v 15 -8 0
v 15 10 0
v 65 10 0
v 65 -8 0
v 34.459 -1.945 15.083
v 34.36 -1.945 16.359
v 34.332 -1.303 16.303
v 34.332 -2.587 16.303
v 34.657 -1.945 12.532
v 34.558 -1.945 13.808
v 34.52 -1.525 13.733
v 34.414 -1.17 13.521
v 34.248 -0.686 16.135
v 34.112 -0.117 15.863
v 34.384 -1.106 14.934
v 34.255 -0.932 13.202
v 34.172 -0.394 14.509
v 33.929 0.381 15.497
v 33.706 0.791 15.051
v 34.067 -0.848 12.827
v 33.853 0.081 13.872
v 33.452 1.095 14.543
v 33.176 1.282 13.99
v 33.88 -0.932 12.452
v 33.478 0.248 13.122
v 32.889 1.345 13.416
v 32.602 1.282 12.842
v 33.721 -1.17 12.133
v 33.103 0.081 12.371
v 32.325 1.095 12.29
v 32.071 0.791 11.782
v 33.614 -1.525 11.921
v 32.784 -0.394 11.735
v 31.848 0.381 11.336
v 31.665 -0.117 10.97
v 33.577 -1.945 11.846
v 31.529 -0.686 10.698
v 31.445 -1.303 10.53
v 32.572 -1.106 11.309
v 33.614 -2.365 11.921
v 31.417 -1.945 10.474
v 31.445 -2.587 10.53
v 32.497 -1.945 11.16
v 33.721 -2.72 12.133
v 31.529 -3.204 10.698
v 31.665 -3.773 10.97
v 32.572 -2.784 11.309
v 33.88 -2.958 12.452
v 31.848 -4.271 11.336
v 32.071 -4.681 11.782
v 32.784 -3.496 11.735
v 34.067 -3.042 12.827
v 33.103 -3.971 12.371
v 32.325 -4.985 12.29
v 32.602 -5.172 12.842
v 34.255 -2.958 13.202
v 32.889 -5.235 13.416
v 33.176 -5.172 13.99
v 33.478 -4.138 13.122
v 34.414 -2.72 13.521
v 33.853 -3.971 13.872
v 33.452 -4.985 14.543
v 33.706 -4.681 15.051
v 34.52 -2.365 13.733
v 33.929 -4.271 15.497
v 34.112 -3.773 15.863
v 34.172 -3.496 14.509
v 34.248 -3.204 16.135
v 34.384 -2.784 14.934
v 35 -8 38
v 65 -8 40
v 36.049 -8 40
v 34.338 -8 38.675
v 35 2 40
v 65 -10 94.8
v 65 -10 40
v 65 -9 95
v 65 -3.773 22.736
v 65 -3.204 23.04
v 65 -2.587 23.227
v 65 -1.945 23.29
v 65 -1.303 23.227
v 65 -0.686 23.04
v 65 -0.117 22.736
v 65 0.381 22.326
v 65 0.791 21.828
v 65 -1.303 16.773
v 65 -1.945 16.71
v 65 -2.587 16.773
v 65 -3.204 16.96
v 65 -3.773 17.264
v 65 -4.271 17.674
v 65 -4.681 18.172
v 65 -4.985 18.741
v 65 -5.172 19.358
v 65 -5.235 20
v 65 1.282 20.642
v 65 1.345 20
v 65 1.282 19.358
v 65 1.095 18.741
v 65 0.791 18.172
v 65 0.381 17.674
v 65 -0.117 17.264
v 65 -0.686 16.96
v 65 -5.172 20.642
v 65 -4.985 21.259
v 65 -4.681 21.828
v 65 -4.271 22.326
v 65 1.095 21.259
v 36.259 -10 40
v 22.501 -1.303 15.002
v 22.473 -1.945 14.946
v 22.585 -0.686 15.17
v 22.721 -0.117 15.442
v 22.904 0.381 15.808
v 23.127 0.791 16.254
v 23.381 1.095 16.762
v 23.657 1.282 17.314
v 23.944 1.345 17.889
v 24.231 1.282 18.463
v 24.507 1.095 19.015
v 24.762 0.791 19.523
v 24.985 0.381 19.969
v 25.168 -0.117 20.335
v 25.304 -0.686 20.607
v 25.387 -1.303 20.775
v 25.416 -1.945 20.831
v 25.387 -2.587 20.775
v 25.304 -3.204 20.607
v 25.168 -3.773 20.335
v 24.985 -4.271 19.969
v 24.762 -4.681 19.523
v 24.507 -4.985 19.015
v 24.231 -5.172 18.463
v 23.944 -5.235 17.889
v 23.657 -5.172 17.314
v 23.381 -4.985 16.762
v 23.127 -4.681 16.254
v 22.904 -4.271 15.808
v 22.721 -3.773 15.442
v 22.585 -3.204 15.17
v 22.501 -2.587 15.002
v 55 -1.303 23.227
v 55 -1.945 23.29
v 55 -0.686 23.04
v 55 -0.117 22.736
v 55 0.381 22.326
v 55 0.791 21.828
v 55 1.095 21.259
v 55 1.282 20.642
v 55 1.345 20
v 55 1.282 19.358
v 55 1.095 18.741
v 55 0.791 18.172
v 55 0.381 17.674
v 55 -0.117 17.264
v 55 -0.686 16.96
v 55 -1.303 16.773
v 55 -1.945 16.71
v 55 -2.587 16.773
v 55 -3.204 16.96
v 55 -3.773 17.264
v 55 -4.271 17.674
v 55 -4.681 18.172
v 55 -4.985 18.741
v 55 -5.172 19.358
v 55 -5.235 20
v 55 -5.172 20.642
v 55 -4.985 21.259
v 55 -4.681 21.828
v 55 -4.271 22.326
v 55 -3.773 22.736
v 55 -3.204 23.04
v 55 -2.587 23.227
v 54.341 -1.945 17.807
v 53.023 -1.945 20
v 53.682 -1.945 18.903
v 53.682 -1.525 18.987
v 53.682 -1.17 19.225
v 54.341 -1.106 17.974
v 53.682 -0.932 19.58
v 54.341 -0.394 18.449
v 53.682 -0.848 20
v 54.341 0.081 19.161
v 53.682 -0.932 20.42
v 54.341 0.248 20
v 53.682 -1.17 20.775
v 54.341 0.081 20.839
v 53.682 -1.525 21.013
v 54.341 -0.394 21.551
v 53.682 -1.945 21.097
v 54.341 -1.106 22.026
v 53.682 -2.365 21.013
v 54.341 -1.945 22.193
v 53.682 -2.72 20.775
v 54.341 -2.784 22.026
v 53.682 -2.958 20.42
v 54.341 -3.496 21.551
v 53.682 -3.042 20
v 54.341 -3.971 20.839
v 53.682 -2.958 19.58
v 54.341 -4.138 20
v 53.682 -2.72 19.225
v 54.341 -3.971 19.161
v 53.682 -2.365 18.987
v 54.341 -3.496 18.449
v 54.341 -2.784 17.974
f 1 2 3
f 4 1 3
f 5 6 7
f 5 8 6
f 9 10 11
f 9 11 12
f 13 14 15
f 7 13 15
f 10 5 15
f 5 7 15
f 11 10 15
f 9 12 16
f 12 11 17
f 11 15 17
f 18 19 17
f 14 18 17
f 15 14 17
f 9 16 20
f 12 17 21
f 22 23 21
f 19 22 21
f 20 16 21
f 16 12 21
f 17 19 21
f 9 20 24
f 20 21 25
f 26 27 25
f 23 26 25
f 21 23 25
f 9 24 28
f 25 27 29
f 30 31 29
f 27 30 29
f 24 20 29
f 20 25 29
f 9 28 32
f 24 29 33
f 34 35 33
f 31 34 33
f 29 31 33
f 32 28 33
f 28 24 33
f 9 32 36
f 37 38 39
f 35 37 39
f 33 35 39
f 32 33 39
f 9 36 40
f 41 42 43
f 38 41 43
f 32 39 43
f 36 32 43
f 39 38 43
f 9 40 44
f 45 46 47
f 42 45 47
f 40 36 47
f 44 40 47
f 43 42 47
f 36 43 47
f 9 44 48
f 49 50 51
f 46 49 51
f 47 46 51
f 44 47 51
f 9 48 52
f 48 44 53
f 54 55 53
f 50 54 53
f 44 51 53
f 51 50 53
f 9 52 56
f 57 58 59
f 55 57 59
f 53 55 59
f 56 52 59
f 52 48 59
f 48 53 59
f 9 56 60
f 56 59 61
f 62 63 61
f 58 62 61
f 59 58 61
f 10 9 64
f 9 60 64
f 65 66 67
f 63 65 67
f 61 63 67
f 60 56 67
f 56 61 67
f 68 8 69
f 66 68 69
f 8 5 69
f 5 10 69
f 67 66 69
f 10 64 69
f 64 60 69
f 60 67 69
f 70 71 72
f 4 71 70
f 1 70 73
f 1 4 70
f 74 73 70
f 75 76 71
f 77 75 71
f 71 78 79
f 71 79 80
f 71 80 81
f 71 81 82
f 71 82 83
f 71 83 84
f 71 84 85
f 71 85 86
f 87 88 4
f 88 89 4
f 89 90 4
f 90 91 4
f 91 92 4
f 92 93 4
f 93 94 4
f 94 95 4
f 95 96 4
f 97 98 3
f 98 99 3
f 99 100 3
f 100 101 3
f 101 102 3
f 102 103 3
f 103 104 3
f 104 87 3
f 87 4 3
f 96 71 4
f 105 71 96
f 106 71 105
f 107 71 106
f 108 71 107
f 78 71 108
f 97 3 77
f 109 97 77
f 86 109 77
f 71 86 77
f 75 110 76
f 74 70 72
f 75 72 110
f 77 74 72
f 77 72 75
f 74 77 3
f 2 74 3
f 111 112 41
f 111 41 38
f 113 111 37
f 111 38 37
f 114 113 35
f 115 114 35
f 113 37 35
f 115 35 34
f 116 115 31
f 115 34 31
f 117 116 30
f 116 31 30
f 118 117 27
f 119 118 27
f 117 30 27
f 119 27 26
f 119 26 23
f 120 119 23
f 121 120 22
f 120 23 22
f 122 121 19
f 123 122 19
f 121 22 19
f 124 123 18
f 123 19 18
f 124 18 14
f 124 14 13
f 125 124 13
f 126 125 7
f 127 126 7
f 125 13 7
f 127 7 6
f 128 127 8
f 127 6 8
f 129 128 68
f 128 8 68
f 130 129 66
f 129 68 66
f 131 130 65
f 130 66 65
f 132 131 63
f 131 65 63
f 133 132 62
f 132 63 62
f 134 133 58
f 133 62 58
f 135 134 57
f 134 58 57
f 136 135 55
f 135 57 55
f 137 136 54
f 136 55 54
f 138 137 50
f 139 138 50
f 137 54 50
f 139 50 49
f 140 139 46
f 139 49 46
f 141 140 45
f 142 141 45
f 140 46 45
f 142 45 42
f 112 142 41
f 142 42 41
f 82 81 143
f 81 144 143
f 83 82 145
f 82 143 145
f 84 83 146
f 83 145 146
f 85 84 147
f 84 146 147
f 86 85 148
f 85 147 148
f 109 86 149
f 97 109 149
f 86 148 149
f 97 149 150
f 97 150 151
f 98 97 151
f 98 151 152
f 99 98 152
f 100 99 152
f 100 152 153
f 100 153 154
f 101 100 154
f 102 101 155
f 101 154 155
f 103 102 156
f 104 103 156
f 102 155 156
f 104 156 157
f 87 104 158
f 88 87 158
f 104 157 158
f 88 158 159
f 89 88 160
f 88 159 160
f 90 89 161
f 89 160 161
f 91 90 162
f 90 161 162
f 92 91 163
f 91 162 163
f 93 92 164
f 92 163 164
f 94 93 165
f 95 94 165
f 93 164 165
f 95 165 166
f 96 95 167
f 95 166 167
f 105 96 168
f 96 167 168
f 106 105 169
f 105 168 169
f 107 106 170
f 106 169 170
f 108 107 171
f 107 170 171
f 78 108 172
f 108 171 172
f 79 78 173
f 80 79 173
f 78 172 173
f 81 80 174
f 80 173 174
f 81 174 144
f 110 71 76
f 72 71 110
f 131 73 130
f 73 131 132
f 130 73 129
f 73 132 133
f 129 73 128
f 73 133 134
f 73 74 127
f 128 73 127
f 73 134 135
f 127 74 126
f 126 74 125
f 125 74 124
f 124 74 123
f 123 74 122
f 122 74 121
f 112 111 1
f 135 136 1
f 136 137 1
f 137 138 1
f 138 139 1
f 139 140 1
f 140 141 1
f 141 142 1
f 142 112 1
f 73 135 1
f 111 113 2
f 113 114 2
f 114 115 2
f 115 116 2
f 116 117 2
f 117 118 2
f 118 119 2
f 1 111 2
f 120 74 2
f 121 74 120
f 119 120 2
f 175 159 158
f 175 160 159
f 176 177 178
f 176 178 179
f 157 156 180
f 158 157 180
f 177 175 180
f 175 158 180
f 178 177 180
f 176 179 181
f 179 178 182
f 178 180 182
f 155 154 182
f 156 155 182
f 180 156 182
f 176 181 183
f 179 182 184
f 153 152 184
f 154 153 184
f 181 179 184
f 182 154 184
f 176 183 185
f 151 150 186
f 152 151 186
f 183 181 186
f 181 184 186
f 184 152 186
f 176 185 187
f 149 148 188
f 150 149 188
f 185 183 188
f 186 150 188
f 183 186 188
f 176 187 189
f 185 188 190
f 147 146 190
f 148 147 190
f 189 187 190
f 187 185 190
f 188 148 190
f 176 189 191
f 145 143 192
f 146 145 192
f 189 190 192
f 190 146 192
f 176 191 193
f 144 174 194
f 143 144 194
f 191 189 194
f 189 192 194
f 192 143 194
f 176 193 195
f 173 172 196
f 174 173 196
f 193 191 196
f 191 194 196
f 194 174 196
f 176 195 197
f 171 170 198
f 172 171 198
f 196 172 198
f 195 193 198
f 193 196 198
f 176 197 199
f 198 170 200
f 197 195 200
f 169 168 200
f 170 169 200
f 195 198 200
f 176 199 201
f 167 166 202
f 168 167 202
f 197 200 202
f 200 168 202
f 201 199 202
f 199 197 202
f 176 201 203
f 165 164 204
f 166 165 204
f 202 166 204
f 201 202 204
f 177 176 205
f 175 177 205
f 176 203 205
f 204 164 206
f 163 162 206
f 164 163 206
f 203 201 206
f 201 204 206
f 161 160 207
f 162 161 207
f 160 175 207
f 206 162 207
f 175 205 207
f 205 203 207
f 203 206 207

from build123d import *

# Parameters (mm, degrees)
ESBO_O1_W                                      = 130
ESBO_O1_H                                      = 20
RESSALTO_EXTRUS_O1_DEPTH                       = 95
CORTE_EXTRUS_O2_REACH                          = 22
CORTE_EXTRUS_O3_DEPTH                          = 1
CORTE_EXTRUS_O3_DEPTH_BACK                     = 61
BROCA_DE_ROSQUEAR_DE_CANO_PARA_TARRAXA_D_D     = 6.579997
BROCA_DE_ROSQUEAR_DE_CANO_PARA_TARRAXA_D_DEPTH = 10
BROCA_DE_ROSQUEAR_DE_CANO_PARA_TARRAXA_D_TIP   = 1.976830535
BROCA_DE_ROSQUEAR_DE_CANO_PARA_TARRA_2_D       = 6.579997
BROCA_DE_ROSQUEAR_DE_CANO_PARA_TARRA_2_DEPTH   = 10
BROCA_DE_ROSQUEAR_DE_CANO_PARA_TARRA_2_TIP     = 1.976830535
ESBO_O12_W                                     = 50
ESBO_O12_H                                     = 2
CORTE_EXTRUS_O4_DEPTH                          = 40
CORTE_EXTRUS_O5_DEPTH                          = 20.611613514


with BuildPart() as part:
    # Esboço1 → Ressalto-extrusão1 (new body)
    with BuildSketch(Plane.XY):
        Rectangle(ESBO_O1_W, ESBO_O1_H)
    extrude(amount=RESSALTO_EXTRUS_O1_DEPTH)

    # Esboço2 → Corte-extrusão2 (cut, up to next)
    with BuildSketch(Plane(origin=(0, 10, 0), x_dir=(1, 0, 0), z_dir=(0, 1, 0)), mode=Mode.PRIVATE) as corte_extrus_o2_sk1:
        Polygon((15, 0), (-65, 0), (-65, -95), (5, -95), (5, -41), (35, -41), (35, -40), align=None)
    corte_extrus_o2_tool1 = extrude(corte_extrus_o2_sk1.sketch, amount=-CORTE_EXTRUS_O2_REACH, mode=Mode.PRIVATE) & part.part
    add(corte_extrus_o2_tool1.solids().sort_by_distance((-24.897504, 10, 44.887255))[0], mode=Mode.SUBTRACT)

    # Esboço3 → Corte-extrusão3 (cut, two sides)
    with BuildSketch(Plane(origin=(65, 0, 0), x_dir=(0, 0, -1), z_dir=(1, 0, 0))) as corte_extrus_o3_sk:
        Polygon((200.200134404, 50.040026881), (0, 10), (-95, -9), (-295.200134404, -49.040026881), (-375.280188165, 351.360241926), (120.120080642, 450.440295688), align=None)
    extrude(amount=CORTE_EXTRUS_O3_DEPTH, mode=Mode.SUBTRACT)
    extrude(corte_extrus_o3_sk.sketch, amount=-CORTE_EXTRUS_O3_DEPTH_BACK, mode=Mode.SUBTRACT)

    # Broca de rosquear de cano para tarraxa d
    with Locations(Plane(origin=(65, 0, 0), x_dir=(0, 0, -1), z_dir=(1, 0, 0))):
        with Locations((-20, -1.945)):
            Hole(BROCA_DE_ROSQUEAR_DE_CANO_PARA_TARRAXA_D_D / 2, depth=BROCA_DE_ROSQUEAR_DE_CANO_PARA_TARRAXA_D_DEPTH)
            with Locations((0, 0, -(BROCA_DE_ROSQUEAR_DE_CANO_PARA_TARRAXA_D_DEPTH + BROCA_DE_ROSQUEAR_DE_CANO_PARA_TARRAXA_D_TIP / 2))):  # 118° drill point
                Cone(0, BROCA_DE_ROSQUEAR_DE_CANO_PARA_TARRAXA_D_D / 2, BROCA_DE_ROSQUEAR_DE_CANO_PARA_TARRAXA_D_TIP, mode=Mode.SUBTRACT)

    # Broca de rosquear de cano para tarra 2
    with Locations(Plane(origin=(12, 0, -6), x_dir=(0.447213595, 0, 0.894427191), z_dir=(-0.894427191, 0, 0.447213595))):
        with Locations((26.708203932, -1.945)):
            Hole(BROCA_DE_ROSQUEAR_DE_CANO_PARA_TARRA_2_D / 2, depth=BROCA_DE_ROSQUEAR_DE_CANO_PARA_TARRA_2_DEPTH)
            with Locations((0, 0, -(BROCA_DE_ROSQUEAR_DE_CANO_PARA_TARRA_2_DEPTH + BROCA_DE_ROSQUEAR_DE_CANO_PARA_TARRA_2_TIP / 2))):  # 118° drill point
                Cone(0, BROCA_DE_ROSQUEAR_DE_CANO_PARA_TARRA_2_D / 2, BROCA_DE_ROSQUEAR_DE_CANO_PARA_TARRA_2_TIP, mode=Mode.SUBTRACT)

    # Esboço12 → Corte-extrusão4 (cut)
    with BuildSketch(Plane(origin=(0, 0, 0), x_dir=(-1, 0, 0), z_dir=(0, 0, -1))):
        with Locations((-40, -9)):
            Rectangle(ESBO_O12_W, ESBO_O12_H)
    extrude(amount=-CORTE_EXTRUS_O4_DEPTH, mode=Mode.SUBTRACT)

    # Esboço13 → Corte-extrusão5 (cut, through all)
    with BuildSketch(Plane(origin=(0, 9.615384615, 1.923076923), x_dir=(1, 0, 0), z_dir=(0, 0.980580676, 0.196116135))):
        Polygon((35, -38.830994757), (65, -94.920209407), (66.558450481, -100.096318767), (-6.379545029, -94.920209407), (-1.820755469, -30.681038758), (34.269484804, -39.561509954), align=None)
    extrude(amount=-CORTE_EXTRUS_O5_DEPTH, mode=Mode.SUBTRACT)


solid = part.part
